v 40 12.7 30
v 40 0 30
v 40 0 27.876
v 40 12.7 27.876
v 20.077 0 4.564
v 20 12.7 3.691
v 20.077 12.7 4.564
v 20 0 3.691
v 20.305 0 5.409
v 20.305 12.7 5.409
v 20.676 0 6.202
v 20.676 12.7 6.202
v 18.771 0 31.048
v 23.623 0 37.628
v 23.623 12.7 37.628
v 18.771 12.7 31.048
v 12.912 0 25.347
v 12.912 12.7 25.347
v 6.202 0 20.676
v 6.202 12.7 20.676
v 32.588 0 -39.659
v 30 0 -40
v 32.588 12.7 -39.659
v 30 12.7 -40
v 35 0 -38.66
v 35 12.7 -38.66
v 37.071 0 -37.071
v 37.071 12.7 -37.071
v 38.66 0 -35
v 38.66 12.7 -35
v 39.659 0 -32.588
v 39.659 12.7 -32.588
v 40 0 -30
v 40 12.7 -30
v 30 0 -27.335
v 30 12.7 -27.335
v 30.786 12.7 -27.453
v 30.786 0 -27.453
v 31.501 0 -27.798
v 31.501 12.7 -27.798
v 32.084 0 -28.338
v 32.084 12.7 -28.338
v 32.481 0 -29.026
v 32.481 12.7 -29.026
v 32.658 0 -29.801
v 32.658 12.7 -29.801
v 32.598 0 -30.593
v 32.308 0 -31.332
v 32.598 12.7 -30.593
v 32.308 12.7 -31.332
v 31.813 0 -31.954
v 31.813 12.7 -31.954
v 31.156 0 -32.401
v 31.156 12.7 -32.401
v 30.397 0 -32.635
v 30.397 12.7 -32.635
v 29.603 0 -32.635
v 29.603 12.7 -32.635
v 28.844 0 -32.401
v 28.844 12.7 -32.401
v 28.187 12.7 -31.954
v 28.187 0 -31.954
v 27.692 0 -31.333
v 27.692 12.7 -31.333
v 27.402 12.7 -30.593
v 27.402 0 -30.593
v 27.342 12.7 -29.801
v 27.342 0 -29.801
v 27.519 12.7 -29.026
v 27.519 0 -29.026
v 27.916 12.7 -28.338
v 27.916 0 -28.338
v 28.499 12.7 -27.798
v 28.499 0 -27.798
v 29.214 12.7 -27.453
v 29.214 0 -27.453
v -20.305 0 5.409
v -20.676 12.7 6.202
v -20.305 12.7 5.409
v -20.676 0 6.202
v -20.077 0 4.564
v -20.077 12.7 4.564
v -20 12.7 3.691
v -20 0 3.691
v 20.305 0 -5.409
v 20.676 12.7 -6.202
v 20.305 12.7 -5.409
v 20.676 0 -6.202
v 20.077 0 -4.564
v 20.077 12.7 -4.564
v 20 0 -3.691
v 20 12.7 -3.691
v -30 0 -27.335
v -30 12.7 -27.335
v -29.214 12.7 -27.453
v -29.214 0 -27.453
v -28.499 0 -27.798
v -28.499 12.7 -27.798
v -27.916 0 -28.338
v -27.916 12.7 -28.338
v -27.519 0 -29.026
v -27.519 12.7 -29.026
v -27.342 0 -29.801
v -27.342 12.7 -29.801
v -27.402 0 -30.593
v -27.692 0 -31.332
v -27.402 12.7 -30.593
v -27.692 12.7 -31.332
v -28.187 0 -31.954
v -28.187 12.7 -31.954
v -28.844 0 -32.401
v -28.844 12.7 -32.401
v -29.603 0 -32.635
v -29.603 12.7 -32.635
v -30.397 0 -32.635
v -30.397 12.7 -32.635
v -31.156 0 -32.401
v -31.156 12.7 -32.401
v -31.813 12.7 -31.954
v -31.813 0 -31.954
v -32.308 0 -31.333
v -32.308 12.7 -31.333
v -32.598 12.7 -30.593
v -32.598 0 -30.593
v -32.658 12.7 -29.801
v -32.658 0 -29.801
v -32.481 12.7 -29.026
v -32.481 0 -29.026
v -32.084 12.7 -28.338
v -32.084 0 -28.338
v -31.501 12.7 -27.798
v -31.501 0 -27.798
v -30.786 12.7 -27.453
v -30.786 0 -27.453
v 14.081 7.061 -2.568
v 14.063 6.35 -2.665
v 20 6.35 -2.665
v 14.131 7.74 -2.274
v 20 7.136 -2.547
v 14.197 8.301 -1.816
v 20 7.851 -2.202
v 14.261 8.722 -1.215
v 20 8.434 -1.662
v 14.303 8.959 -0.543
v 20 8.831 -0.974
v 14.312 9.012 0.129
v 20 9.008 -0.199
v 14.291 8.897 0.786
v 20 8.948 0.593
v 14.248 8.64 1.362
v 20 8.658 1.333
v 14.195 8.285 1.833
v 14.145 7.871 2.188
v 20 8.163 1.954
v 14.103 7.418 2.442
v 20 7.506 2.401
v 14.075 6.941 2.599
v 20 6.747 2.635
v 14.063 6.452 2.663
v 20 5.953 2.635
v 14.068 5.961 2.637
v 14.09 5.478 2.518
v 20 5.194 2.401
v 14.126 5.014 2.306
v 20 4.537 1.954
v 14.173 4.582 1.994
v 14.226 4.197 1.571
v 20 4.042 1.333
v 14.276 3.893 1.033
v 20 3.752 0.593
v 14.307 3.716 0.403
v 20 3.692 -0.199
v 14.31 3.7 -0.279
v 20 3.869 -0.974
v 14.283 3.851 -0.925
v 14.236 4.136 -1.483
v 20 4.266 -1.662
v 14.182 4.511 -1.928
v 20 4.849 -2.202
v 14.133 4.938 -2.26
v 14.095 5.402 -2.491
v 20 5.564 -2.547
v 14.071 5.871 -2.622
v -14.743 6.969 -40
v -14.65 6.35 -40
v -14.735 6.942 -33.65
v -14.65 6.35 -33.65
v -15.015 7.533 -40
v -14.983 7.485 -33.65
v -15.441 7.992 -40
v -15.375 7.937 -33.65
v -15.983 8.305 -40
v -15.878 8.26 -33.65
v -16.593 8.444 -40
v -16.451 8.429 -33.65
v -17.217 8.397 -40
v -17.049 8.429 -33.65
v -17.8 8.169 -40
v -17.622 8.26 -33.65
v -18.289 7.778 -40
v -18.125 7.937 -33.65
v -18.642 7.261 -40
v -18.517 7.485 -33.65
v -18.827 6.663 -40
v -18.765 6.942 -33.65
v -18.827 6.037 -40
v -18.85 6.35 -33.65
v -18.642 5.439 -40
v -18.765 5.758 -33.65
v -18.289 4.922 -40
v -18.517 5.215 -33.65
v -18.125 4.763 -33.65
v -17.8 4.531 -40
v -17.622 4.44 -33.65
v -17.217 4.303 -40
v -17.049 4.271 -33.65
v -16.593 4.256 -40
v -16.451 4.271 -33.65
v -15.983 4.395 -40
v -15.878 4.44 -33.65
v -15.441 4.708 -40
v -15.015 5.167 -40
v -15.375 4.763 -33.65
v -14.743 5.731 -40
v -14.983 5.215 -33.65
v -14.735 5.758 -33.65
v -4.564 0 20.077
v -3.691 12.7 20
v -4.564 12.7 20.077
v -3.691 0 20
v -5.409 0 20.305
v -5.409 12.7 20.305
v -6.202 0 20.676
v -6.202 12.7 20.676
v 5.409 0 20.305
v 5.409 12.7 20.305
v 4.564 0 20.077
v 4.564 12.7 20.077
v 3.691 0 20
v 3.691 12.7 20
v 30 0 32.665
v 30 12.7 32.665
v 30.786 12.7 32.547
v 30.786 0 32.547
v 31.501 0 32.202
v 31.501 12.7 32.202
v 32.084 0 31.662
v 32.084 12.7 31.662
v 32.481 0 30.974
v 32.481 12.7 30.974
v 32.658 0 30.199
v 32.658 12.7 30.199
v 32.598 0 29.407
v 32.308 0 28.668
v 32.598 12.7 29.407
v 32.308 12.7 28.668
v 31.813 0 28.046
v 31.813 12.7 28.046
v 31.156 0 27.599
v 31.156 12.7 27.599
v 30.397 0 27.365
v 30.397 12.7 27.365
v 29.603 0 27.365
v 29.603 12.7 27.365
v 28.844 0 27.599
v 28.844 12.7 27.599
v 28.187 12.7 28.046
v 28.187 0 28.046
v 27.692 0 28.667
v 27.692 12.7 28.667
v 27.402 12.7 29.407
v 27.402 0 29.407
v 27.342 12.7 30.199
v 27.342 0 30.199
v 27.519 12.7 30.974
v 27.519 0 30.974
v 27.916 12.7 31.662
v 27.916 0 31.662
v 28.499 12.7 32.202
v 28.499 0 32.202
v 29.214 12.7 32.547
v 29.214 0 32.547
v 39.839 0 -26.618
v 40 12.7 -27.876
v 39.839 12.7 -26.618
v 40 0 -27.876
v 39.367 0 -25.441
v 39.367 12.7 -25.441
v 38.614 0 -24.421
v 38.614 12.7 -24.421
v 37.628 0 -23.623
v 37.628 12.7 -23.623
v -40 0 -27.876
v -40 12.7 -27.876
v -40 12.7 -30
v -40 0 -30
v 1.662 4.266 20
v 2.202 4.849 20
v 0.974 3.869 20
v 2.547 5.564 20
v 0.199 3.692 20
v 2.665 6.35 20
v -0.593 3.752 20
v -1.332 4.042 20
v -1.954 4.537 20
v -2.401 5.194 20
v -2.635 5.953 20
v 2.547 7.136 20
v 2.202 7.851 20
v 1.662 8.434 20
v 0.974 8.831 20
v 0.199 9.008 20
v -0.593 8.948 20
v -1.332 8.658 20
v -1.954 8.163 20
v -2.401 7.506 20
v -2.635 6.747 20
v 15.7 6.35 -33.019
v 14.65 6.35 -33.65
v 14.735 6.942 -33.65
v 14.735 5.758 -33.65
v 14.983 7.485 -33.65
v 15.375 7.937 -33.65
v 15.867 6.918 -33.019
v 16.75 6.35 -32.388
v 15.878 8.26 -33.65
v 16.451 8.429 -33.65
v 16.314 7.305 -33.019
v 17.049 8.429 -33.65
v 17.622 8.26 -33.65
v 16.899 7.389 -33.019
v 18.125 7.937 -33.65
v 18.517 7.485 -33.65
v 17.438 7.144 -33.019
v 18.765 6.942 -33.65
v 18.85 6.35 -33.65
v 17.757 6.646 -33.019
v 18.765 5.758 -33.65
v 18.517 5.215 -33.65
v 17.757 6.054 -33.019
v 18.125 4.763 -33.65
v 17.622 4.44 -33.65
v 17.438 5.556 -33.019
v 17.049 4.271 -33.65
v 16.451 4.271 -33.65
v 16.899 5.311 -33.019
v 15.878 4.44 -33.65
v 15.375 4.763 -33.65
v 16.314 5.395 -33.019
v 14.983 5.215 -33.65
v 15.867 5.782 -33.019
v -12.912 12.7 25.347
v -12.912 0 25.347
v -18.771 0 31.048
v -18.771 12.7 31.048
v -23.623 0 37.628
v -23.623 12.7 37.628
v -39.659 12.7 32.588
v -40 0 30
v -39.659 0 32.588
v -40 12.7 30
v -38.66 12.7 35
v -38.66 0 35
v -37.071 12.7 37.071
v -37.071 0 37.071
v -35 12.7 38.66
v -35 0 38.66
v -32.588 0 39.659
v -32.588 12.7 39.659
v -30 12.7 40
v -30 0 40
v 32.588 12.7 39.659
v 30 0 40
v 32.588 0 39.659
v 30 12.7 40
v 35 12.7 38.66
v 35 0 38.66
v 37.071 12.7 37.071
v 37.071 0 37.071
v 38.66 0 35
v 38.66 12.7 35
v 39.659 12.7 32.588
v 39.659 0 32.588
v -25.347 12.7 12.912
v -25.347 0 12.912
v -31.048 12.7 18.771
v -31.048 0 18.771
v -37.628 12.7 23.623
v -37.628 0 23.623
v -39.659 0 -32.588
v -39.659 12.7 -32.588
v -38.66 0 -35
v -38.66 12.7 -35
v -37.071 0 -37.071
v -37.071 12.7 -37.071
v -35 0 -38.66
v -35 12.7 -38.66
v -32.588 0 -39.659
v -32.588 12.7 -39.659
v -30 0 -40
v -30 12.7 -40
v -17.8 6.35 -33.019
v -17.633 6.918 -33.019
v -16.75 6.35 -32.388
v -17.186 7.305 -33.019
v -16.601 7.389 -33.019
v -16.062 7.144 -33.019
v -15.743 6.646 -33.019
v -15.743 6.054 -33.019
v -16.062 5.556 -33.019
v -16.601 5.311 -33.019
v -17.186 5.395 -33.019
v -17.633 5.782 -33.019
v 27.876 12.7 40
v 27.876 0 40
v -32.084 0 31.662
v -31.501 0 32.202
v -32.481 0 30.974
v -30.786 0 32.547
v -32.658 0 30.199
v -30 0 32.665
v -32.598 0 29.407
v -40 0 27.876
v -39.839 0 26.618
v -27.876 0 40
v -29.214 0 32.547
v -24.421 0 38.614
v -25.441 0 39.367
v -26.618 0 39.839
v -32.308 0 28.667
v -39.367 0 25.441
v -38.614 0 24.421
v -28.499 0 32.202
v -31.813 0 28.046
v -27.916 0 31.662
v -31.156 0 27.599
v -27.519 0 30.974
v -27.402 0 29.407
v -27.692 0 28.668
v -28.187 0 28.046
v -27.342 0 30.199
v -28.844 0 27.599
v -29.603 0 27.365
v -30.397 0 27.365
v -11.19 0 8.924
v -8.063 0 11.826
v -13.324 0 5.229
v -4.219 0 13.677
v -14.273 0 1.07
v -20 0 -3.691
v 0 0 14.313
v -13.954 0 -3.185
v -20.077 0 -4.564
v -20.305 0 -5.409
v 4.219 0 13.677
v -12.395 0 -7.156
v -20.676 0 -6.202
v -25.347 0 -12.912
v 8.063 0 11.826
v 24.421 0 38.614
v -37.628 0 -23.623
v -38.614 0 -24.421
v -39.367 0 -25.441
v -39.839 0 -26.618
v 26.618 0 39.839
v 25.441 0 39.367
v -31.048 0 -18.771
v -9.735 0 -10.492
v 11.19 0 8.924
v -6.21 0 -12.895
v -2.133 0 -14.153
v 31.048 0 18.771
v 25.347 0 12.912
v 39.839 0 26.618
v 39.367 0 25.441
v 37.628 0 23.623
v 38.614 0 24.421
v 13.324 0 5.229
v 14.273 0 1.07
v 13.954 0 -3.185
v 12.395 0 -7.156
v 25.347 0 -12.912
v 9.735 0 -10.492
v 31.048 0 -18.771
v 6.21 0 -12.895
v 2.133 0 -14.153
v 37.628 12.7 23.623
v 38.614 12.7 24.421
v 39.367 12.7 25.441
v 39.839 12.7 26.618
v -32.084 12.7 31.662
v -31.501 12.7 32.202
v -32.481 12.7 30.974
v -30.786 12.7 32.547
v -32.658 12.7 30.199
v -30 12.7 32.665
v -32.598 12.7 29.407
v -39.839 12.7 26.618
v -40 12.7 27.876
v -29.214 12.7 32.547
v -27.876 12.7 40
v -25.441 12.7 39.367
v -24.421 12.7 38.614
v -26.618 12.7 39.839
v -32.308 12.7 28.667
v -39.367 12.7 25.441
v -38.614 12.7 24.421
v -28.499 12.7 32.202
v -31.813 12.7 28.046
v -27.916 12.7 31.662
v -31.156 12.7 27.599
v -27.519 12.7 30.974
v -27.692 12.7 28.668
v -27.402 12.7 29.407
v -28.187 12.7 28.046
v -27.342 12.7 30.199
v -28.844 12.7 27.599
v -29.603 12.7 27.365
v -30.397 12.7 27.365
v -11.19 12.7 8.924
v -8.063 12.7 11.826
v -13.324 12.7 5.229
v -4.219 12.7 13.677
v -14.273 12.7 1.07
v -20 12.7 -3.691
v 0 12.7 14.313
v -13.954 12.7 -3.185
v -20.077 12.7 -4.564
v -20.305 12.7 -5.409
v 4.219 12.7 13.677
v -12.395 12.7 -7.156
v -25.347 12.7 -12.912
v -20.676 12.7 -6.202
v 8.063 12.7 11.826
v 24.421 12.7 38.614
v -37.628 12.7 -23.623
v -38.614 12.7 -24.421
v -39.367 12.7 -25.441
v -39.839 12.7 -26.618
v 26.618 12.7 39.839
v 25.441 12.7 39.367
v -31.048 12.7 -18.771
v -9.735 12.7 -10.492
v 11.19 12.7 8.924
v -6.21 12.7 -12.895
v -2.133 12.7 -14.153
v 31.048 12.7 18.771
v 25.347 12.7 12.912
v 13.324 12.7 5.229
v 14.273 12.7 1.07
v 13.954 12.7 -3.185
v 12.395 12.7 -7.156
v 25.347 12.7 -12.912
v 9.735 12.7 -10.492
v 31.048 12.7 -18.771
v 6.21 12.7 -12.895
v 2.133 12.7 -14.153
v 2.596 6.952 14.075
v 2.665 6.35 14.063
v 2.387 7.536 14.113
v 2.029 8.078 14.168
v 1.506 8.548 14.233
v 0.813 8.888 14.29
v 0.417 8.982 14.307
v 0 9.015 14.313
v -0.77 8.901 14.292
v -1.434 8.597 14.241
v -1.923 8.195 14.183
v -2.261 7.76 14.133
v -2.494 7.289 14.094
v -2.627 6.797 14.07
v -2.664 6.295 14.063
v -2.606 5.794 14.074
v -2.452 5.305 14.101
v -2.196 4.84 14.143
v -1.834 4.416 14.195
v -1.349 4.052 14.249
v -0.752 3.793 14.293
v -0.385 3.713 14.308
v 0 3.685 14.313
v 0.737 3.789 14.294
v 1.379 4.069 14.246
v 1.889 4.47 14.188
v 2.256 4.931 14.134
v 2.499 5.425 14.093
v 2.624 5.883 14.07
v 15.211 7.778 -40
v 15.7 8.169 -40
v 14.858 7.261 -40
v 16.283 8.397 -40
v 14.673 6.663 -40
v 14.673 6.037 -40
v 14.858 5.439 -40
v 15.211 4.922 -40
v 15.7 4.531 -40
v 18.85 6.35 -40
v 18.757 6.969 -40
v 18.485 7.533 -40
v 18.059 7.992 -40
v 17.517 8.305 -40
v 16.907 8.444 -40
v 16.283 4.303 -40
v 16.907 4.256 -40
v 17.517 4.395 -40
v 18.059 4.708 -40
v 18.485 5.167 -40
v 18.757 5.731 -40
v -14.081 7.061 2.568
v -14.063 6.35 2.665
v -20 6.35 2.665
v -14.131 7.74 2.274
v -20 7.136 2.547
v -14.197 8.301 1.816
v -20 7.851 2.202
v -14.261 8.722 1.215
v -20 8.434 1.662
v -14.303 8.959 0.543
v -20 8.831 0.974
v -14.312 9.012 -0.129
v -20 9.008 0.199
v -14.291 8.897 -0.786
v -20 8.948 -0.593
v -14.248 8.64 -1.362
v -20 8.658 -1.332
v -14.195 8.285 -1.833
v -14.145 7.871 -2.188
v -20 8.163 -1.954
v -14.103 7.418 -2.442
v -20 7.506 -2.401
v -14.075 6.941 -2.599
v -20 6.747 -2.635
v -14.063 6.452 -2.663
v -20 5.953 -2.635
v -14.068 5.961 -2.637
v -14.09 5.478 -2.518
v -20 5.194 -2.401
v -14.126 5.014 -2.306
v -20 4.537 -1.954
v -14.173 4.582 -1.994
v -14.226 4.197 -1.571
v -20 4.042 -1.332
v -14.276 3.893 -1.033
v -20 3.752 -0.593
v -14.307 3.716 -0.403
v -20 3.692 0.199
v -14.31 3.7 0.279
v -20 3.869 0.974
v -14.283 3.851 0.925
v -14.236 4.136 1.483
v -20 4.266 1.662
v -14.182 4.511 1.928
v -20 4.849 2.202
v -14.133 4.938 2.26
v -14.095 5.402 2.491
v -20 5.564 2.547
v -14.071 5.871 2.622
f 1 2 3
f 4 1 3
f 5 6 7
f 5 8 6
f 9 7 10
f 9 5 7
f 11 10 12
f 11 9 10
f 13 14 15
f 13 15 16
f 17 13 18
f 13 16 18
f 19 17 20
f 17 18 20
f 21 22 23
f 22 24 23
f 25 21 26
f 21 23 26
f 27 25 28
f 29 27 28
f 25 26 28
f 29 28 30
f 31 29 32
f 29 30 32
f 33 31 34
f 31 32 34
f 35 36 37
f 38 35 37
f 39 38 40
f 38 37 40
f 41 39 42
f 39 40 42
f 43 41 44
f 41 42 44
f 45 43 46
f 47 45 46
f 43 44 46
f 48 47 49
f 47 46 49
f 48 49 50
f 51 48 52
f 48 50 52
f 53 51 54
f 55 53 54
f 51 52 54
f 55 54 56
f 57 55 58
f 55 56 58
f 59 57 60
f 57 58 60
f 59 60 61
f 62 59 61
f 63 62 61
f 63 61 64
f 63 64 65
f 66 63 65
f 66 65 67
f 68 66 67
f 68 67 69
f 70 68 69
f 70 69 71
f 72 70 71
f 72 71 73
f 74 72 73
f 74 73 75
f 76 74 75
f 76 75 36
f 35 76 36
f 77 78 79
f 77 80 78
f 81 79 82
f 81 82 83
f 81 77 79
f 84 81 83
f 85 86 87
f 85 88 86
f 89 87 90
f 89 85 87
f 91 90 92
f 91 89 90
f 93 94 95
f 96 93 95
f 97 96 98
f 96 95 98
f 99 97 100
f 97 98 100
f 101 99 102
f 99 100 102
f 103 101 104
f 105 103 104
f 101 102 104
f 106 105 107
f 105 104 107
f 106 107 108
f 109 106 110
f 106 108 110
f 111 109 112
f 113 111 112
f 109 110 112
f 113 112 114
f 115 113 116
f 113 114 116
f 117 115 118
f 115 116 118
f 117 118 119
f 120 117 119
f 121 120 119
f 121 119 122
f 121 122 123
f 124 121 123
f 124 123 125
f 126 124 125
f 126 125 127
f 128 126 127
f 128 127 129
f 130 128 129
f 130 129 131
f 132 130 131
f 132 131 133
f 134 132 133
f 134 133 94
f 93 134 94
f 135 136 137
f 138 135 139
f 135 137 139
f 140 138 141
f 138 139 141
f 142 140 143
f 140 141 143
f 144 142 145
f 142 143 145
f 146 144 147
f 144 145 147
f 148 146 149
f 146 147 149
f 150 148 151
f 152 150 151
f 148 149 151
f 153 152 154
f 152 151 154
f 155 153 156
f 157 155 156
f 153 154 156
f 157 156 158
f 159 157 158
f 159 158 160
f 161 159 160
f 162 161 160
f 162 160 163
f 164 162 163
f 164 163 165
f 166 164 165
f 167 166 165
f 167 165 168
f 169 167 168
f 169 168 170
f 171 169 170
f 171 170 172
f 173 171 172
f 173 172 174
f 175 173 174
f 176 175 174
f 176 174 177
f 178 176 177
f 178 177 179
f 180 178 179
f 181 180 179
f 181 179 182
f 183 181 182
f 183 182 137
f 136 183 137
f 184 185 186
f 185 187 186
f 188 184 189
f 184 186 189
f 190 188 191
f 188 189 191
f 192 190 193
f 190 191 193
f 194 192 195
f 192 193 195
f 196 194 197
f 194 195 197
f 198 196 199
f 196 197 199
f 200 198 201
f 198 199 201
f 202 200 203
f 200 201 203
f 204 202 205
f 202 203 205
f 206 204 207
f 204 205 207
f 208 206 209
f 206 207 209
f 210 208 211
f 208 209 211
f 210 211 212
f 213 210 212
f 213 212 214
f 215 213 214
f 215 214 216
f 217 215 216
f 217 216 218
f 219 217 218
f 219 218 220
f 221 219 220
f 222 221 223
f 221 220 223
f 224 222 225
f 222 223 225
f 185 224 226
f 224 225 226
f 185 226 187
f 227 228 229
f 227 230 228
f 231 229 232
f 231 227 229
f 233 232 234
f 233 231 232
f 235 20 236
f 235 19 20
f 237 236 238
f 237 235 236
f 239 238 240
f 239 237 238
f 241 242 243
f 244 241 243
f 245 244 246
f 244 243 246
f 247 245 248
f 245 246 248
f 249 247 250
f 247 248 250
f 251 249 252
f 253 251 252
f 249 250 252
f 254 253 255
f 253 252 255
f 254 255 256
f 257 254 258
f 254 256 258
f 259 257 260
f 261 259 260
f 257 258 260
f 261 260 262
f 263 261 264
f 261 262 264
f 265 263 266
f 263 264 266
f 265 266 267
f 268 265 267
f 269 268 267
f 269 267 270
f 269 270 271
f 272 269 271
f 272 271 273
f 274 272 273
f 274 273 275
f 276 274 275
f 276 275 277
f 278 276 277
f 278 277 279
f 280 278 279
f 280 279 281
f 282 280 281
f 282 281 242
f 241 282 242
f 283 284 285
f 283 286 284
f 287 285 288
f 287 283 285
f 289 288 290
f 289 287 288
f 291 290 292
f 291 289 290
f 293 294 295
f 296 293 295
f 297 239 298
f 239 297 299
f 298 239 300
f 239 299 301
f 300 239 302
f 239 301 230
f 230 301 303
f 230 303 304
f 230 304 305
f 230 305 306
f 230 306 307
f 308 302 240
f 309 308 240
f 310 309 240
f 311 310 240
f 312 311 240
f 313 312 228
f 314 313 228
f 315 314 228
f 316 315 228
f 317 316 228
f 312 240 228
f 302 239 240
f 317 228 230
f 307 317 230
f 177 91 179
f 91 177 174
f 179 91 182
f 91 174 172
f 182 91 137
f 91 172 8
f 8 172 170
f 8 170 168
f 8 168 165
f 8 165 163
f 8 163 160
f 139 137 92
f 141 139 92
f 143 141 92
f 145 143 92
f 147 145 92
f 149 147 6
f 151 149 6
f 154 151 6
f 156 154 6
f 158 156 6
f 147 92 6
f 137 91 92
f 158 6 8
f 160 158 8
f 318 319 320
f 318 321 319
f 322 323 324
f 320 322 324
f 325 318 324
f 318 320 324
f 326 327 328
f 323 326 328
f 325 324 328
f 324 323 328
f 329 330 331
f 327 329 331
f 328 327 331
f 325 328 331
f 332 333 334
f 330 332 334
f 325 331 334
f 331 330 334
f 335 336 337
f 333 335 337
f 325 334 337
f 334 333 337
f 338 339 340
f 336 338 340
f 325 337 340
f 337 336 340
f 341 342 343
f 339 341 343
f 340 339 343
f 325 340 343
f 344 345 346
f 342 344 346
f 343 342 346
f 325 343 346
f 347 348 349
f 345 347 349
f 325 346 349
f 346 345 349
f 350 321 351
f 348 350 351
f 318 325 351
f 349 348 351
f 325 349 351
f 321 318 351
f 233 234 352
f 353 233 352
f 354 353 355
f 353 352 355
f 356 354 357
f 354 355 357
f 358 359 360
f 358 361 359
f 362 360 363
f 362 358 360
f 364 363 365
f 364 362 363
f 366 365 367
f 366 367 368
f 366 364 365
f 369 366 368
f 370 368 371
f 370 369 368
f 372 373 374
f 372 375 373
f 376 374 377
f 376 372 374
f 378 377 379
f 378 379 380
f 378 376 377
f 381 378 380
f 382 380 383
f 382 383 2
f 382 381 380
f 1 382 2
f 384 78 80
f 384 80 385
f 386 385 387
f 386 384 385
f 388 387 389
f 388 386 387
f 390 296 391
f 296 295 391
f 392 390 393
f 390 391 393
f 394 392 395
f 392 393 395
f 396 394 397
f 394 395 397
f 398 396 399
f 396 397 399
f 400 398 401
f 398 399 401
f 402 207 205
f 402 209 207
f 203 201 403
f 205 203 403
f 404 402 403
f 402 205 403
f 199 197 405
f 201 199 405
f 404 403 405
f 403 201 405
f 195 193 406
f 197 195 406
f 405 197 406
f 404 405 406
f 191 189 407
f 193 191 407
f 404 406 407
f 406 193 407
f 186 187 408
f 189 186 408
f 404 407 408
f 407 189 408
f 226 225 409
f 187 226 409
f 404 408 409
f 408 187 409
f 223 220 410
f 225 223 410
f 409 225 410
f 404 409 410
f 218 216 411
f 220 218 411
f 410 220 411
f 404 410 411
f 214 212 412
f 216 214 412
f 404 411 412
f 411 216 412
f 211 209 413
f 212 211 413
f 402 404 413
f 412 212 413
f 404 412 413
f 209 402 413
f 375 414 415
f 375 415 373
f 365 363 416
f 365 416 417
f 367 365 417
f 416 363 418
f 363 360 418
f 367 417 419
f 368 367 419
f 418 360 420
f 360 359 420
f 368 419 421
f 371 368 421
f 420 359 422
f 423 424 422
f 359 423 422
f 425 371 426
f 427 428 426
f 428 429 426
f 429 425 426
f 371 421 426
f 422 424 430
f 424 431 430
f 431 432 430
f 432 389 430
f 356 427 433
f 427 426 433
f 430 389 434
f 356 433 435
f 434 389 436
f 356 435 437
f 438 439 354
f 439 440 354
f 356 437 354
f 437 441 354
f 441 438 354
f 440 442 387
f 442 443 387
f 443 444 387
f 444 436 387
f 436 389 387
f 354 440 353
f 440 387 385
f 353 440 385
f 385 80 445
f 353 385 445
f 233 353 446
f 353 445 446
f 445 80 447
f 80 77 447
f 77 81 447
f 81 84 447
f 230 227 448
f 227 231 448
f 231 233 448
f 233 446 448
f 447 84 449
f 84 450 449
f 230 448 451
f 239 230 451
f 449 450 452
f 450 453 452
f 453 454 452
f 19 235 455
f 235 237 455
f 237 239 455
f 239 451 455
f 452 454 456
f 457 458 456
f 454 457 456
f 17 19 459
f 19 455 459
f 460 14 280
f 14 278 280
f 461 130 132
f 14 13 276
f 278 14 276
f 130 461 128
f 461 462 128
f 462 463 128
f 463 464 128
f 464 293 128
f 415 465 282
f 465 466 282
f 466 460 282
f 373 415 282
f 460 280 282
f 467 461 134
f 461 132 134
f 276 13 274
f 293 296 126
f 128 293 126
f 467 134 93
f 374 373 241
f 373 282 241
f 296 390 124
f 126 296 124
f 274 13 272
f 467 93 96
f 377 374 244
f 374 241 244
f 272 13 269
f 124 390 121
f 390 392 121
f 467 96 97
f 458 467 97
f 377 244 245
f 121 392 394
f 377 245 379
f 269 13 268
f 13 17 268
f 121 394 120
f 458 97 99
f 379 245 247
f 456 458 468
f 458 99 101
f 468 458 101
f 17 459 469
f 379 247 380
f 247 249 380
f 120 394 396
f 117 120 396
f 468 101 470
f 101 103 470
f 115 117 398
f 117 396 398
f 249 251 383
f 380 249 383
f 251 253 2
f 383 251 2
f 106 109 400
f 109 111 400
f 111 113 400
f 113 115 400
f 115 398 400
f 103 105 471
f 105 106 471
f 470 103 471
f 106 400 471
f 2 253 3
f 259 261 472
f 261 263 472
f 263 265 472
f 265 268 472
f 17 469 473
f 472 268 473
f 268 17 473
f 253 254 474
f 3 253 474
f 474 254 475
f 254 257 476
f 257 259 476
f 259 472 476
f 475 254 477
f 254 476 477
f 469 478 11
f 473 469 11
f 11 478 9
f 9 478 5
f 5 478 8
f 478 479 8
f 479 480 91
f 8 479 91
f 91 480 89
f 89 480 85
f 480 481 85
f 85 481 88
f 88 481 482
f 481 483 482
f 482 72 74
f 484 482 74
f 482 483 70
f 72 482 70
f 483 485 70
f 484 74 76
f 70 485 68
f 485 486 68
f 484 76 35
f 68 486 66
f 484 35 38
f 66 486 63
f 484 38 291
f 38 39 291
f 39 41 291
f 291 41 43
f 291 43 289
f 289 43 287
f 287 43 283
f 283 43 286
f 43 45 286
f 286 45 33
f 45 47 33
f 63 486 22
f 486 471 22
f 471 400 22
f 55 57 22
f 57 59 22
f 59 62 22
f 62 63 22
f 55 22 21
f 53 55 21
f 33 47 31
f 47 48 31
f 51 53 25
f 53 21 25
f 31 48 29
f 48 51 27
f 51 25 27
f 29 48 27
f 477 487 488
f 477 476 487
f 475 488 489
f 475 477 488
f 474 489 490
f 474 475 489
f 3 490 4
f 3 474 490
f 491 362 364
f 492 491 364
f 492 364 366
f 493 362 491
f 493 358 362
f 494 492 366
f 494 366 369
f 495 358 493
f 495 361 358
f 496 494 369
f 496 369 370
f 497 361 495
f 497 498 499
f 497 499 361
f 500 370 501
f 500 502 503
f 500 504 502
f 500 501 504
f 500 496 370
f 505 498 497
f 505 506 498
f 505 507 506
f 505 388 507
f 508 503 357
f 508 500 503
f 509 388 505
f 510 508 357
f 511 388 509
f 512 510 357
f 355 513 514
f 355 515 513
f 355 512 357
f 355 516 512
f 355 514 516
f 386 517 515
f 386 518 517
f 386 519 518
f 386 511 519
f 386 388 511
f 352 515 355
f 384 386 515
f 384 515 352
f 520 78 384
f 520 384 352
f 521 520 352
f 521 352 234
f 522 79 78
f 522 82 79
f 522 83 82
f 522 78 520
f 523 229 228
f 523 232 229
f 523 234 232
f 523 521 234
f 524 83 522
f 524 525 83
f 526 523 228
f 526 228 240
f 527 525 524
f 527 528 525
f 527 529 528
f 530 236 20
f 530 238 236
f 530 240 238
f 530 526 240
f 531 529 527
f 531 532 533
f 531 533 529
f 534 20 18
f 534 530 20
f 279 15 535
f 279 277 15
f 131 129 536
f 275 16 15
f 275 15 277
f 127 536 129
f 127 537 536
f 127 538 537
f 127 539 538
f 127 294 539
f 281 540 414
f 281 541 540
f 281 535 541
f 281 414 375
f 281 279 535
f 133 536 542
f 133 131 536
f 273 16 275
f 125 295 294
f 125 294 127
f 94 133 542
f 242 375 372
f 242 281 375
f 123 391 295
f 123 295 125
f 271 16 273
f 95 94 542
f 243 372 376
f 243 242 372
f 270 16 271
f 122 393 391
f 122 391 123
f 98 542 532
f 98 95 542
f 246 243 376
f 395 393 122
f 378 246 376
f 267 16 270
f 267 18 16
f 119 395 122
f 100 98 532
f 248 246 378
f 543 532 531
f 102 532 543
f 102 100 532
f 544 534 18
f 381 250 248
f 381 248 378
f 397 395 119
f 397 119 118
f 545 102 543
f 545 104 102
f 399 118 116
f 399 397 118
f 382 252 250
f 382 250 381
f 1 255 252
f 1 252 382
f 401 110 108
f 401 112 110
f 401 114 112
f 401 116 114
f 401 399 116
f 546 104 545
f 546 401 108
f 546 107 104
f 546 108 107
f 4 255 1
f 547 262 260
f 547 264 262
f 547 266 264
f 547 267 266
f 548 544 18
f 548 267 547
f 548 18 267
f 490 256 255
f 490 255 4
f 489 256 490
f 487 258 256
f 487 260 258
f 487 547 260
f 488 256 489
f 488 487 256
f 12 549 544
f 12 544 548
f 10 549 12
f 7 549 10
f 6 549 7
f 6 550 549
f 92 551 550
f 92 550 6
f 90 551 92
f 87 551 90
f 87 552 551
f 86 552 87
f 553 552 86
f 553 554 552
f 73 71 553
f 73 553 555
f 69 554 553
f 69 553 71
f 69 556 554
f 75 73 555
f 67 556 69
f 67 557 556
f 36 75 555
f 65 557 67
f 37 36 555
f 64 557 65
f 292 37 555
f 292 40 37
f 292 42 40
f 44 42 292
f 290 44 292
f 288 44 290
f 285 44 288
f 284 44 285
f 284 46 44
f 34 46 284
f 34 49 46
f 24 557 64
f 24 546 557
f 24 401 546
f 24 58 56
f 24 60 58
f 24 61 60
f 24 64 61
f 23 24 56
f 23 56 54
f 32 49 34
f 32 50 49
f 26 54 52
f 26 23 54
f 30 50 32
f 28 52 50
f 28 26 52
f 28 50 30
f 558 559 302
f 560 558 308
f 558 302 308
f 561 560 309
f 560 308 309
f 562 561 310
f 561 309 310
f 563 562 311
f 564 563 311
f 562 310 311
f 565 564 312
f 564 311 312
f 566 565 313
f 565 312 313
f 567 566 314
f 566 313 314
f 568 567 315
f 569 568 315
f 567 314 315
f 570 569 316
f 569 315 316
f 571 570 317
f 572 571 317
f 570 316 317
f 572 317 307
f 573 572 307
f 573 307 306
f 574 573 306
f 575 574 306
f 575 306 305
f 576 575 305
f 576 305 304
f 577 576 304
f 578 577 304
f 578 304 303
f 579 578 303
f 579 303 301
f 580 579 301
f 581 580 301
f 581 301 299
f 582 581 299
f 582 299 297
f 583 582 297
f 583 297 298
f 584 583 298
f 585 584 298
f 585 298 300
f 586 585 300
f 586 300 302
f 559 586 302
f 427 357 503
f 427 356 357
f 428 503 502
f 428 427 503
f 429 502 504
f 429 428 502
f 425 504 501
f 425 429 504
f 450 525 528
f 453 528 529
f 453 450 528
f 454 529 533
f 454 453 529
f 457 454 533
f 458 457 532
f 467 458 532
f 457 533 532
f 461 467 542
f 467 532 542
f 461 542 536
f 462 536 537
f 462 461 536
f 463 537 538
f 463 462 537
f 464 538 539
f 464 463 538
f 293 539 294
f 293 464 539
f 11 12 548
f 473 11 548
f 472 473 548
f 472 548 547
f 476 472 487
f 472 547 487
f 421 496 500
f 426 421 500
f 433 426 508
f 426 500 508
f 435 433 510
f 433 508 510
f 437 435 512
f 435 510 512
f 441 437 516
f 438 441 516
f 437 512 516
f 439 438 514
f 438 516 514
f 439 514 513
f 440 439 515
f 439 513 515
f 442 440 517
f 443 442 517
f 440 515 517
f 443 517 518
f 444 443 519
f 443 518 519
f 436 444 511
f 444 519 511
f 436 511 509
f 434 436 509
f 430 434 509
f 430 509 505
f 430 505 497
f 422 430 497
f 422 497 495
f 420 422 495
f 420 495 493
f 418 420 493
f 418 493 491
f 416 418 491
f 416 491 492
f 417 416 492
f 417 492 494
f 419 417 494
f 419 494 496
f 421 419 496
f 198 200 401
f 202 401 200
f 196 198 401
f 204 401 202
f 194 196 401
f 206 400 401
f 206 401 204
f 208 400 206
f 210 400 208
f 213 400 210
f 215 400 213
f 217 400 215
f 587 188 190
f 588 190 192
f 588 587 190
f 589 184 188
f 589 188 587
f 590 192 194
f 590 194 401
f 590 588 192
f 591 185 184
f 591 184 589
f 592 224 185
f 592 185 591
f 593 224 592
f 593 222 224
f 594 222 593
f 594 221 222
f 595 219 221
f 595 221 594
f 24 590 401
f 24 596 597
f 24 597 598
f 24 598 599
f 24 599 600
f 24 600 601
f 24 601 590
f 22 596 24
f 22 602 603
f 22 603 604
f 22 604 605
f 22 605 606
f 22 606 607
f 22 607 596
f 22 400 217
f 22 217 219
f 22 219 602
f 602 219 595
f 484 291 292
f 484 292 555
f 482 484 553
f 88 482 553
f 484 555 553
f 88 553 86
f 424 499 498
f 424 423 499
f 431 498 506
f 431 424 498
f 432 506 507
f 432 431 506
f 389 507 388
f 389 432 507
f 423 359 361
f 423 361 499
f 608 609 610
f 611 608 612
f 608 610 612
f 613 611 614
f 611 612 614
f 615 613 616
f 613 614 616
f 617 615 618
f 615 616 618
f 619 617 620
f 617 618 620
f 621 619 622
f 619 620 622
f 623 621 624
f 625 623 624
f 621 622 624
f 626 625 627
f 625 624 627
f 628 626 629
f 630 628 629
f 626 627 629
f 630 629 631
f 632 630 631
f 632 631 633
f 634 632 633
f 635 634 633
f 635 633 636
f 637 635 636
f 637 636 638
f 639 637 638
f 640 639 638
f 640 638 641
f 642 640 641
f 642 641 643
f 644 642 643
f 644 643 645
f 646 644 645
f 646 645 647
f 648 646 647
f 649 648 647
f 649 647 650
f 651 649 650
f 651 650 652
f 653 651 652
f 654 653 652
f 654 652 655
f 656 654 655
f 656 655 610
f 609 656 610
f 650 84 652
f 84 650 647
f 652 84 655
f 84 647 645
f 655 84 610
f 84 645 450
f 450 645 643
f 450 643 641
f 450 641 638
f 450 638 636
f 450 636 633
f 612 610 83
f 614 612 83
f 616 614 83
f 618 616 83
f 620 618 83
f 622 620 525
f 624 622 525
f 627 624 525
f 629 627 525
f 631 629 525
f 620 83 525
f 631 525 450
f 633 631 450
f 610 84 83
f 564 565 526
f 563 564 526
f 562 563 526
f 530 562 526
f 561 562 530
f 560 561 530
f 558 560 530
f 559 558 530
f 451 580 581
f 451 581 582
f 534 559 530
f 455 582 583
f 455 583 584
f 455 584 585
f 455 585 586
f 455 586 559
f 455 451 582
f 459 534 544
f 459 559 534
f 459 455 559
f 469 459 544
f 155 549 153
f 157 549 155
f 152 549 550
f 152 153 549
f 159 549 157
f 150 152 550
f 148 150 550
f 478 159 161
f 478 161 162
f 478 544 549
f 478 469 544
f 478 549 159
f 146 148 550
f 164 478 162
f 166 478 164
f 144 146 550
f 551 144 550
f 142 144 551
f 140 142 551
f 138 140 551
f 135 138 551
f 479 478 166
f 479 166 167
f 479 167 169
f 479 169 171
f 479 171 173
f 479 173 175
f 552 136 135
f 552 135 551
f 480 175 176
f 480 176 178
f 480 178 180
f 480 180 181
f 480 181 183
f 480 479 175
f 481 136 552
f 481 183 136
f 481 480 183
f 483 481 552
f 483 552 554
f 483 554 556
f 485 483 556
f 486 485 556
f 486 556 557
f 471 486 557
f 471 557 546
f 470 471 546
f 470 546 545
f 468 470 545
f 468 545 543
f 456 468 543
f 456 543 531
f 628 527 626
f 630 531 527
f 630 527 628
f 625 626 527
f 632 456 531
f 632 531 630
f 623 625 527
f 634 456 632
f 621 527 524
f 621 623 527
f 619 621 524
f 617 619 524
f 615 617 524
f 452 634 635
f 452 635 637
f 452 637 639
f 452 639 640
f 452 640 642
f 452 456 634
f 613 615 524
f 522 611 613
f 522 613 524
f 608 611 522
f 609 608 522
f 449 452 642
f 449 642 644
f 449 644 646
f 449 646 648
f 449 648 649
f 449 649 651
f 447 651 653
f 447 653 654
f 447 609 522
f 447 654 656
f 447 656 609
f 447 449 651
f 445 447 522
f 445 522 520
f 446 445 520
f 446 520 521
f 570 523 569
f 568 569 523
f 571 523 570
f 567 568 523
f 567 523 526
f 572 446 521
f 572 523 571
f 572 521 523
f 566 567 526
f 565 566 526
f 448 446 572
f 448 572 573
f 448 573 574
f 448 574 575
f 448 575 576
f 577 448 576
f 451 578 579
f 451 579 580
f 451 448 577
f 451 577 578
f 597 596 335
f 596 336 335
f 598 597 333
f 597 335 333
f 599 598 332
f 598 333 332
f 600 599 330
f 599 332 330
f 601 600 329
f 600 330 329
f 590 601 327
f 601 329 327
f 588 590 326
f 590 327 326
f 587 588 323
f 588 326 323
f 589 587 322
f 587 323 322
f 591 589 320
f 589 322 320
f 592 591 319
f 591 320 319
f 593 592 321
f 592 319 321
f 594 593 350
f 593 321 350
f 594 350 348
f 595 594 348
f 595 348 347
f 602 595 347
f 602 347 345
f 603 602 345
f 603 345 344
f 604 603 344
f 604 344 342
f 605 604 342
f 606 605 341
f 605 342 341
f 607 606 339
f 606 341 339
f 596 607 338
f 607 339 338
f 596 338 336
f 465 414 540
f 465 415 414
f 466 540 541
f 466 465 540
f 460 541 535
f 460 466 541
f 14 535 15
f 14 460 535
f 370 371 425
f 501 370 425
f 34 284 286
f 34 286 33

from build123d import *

# Parameters (mm, degrees)
SKETCH1_W                 = 80
SKETCH1_H                 = 80
SKETCH1_R                 = 14.3129
BOSS_EXTRUDE1_DEPTH       = 12.7
FILLET1_R                 = 10
CUT_EXTRUDE1_REACH        = 59.977
CUT_EXTRUDE2_REACH        = 75.221
CUT_EXTRUDE2_END_RADIUS   = 14.3129
SKETCH3_R                 = 2.665
FILLET2_R                 = 5
CUT_EXTRUDE3_REACH        = 59.977
SKETCH4_R                 = 2.665
CIRPATTERN1_COUNT         = 3
CIRPATTERN1_ANGLE         = 180
FILLET3_R                 = 5
CIRPATTERN2_COUNT         = 3
CIRPATTERN2_ANGLE         = 180
M5X0_8_TAPPED_HOLE1_D     = 4.2
M5X0_8_TAPPED_HOLE1_DEPTH = 6.35
M5X0_8_TAPPED_HOLE1_TIP   = 1.2618073


with BuildPart() as part:
    # Sketch1 → Boss-Extrude1 (new body)
    with BuildSketch(Plane(origin=(0, 0, 0), x_dir=(1, 0, 0), z_dir=(0, 1, 0))):
        Rectangle(SKETCH1_W, SKETCH1_H)
        with Locations(Location((0, 0, 0), (0, 0, 270))):
            Circle(SKETCH1_R, mode=Mode.SUBTRACT)
    extrude(amount=BOSS_EXTRUDE1_DEPTH)

    # Fillet1
    fillet1_edges = [part.edges().sort_by_distance(p)[0] for p in [
        (40, 6.35, 40),
        (-40, 6.35, 40),
        (-40, 6.35, -40),
        (40, 6.35, -40),
    ]]
    fillet(fillet1_edges, radius=FILLET1_R)

    # Sketch2 → Cut-Extrude1 (cut, up to next)
    with BuildSketch(Plane(origin=(0, 12.7, 0), x_dir=(1, 0, 0), z_dir=(0, 1, 0)), mode=Mode.PRIVATE) as cut_extrude1_sk1:
        with BuildLine():
            ThreePointArc((40, 25), (28.556310856, 16.443689144), (20, 5))
            Line((20, 5), (20, 0))
            Line((20, 0), (40, 0))
            Line((40, 0), (40, 25))
        make_face()
    cut_extrude1_tool1 = extrude(cut_extrude1_sk1.sketch, amount=-CUT_EXTRUDE1_REACH, mode=Mode.PRIVATE) & part.part
    # Sketch2 → Cut-Extrude1 (cut, up to next)
    with BuildSketch(Plane(origin=(0, 12.7, 0), x_dir=(1, 0, 0), z_dir=(0, 1, 0)), mode=Mode.PRIVATE) as cut_extrude1_sk2:
        with BuildLine():
            Line((40, 0), (20, 0))
            Line((20, 0), (20, -5))
            ThreePointArc((20, -5), (28.556310856, -16.443689144), (40, -25))
            Line((40, -25), (40, 0))
        make_face()
    cut_extrude1_tool2 = extrude(cut_extrude1_sk2.sketch, amount=-CUT_EXTRUDE1_REACH, mode=Mode.PRIVATE) & part.part
    cut_extrude1_1 = cut_extrude1_tool1.solids().sort_by_distance((31.902516, 12.7, -9.406449))[0]
    add(cut_extrude1_1, mode=Mode.SUBTRACT)
    cut_extrude1_2 = cut_extrude1_tool2.solids().sort_by_distance((31.902516, 12.7, 9.406449))[0]
    add(cut_extrude1_2, mode=Mode.SUBTRACT)
    cut_extrude1 = cut_extrude1_1 + cut_extrude1_2  # Cut-Extrude1 as one shape, for the pattern or mirror that repeats it

    # Mirror1: Cut-Extrude1 across plane
    add(cut_extrude1.mirror(Plane(origin=(0, 0, 0), x_dir=(0, 0, 1), z_dir=(1, 0, 0))), mode=Mode.SUBTRACT)

    # Cut-Extrude2: up to this cylinder (the profile starts outside it)
    cut_extrude2_end = Plane(origin=(0, 6.35, 0), z_dir=(0, -1, 0)) * Cylinder(CUT_EXTRUDE2_END_RADIUS, 180.0678, mode=Mode.PRIVATE)
    # Sketch3 → Cut-Extrude2 (cut, up to the surface)
    with BuildSketch(Plane(origin=(20, 0, 0), x_dir=(0, 0, -1), z_dir=(1, 0, 0)), mode=Mode.PRIVATE) as cut_extrude2_sk1:
        with Locations((0, 6.35)):
            Circle(SKETCH3_R)
    cut_extrude2_tool1 = extrude(cut_extrude2_sk1.sketch, amount=-CUT_EXTRUDE2_REACH, mode=Mode.PRIVATE) - cut_extrude2_end
    cut_extrude2 = cut_extrude2_tool1.solids().sort_by_distance((20, 6.35, 0))[0]
    add(cut_extrude2, mode=Mode.SUBTRACT)

    # Fillet2
    fillet2_edges = [part.edges().sort_by_distance(p)[0] for p in [
        (20, 6.35, 5),
        (20, 6.35, -5),
        (40, 6.35, -25),
        (40, 6.35, 25),
        (-20, 6.35, -5),
        (-20, 6.35, 5),
        (-40, 6.35, 25),
        (-40, 6.35, -25),
    ]]
    fillet(fillet2_edges, radius=FILLET2_R)

    # Sketch4 → Cut-Extrude3 (cut, up to next)
    with BuildSketch(Plane(origin=(0, 12.7, 0), x_dir=(1, 0, 0), z_dir=(0, 1, 0)), mode=Mode.PRIVATE) as cut_extrude3_sk1:
        with Locations(Location((-30, 30, 0), (0, 0, 270))):
            Circle(SKETCH4_R)
    cut_extrude3_tool1 = extrude(cut_extrude3_sk1.sketch, amount=-CUT_EXTRUDE3_REACH, mode=Mode.PRIVATE) & part.part
    # Sketch4 → Cut-Extrude3 (cut, up to next)
    with BuildSketch(Plane(origin=(0, 12.7, 0), x_dir=(1, 0, 0), z_dir=(0, 1, 0)), mode=Mode.PRIVATE) as cut_extrude3_sk2:
        with Locations(Location((30, 30, 0), (0, 0, 270))):
            Circle(SKETCH4_R)
    cut_extrude3_tool2 = extrude(cut_extrude3_sk2.sketch, amount=-CUT_EXTRUDE3_REACH, mode=Mode.PRIVATE) & part.part
    # Sketch4 → Cut-Extrude3 (cut, up to next)
    with BuildSketch(Plane(origin=(0, 12.7, 0), x_dir=(1, 0, 0), z_dir=(0, 1, 0)), mode=Mode.PRIVATE) as cut_extrude3_sk3:
        with Locations(Location((30, -30, 0), (0, 0, 270))):
            Circle(SKETCH4_R)
    cut_extrude3_tool3 = extrude(cut_extrude3_sk3.sketch, amount=-CUT_EXTRUDE3_REACH, mode=Mode.PRIVATE) & part.part
    # Sketch4 → Cut-Extrude3 (cut, up to next)
    with BuildSketch(Plane(origin=(0, 12.7, 0), x_dir=(1, 0, 0), z_dir=(0, 1, 0)), mode=Mode.PRIVATE) as cut_extrude3_sk4:
        with Locations(Location((-30, -30, 0), (0, 0, 270))):
            Circle(SKETCH4_R)
    cut_extrude3_tool4 = extrude(cut_extrude3_sk4.sketch, amount=-CUT_EXTRUDE3_REACH, mode=Mode.PRIVATE) & part.part
    add(cut_extrude3_tool1.solids().sort_by_distance((-30, 12.7, -30))[0], mode=Mode.SUBTRACT)
    add(cut_extrude3_tool2.solids().sort_by_distance((30, 12.7, -30))[0], mode=Mode.SUBTRACT)
    add(cut_extrude3_tool3.solids().sort_by_distance((30, 12.7, 30))[0], mode=Mode.SUBTRACT)
    add(cut_extrude3_tool4.solids().sort_by_distance((-30, 12.7, 30))[0], mode=Mode.SUBTRACT)

    # CirPattern1: Cut-Extrude1 ×3 about axis
    cirpattern1_axis = Axis((0, 0, 0), (0, -1, 0))
    for i in range(1, CIRPATTERN1_COUNT):
        add(cut_extrude1.rotate(cirpattern1_axis, i * CIRPATTERN1_ANGLE / (CIRPATTERN1_COUNT - 1)), mode=Mode.SUBTRACT)

    # Fillet3
    fillet3_edges = [part.edges().sort_by_distance(p)[0] for p in [
        (-5, 6.35, 20),
        (5, 6.35, 20),
        (25, 6.35, 40),
        (-25, 6.35, 40),
        (-20, 6.35, 5),
        (-20, 6.35, -5),
    ]]
    fillet(fillet3_edges, radius=FILLET3_R)

    # CirPattern2: Cut-Extrude2 ×3 about axis
    cirpattern2_axis = Axis((0, 12.7, 0), (0, -1, 0))
    for i in range(1, CIRPATTERN2_COUNT):
        add(cut_extrude2.rotate(cirpattern2_axis, i * CIRPATTERN2_ANGLE / (CIRPATTERN2_COUNT - 1)), mode=Mode.SUBTRACT)

    # M5x0.8 Tapped Hole1
    with Locations(Plane(origin=(16.75, 6.35, -40), x_dir=(-1, 0, 0), z_dir=(0, 0, -1))):
        with Locations((0, 0), (33.5, 0)):
            Hole(M5X0_8_TAPPED_HOLE1_D / 2, depth=M5X0_8_TAPPED_HOLE1_DEPTH)
            with Locations((0, 0, -(M5X0_8_TAPPED_HOLE1_DEPTH + M5X0_8_TAPPED_HOLE1_TIP / 2))):  # 118° drill point
                Cone(0, M5X0_8_TAPPED_HOLE1_D / 2, M5X0_8_TAPPED_HOLE1_TIP, mode=Mode.SUBTRACT)


solid = part.part
